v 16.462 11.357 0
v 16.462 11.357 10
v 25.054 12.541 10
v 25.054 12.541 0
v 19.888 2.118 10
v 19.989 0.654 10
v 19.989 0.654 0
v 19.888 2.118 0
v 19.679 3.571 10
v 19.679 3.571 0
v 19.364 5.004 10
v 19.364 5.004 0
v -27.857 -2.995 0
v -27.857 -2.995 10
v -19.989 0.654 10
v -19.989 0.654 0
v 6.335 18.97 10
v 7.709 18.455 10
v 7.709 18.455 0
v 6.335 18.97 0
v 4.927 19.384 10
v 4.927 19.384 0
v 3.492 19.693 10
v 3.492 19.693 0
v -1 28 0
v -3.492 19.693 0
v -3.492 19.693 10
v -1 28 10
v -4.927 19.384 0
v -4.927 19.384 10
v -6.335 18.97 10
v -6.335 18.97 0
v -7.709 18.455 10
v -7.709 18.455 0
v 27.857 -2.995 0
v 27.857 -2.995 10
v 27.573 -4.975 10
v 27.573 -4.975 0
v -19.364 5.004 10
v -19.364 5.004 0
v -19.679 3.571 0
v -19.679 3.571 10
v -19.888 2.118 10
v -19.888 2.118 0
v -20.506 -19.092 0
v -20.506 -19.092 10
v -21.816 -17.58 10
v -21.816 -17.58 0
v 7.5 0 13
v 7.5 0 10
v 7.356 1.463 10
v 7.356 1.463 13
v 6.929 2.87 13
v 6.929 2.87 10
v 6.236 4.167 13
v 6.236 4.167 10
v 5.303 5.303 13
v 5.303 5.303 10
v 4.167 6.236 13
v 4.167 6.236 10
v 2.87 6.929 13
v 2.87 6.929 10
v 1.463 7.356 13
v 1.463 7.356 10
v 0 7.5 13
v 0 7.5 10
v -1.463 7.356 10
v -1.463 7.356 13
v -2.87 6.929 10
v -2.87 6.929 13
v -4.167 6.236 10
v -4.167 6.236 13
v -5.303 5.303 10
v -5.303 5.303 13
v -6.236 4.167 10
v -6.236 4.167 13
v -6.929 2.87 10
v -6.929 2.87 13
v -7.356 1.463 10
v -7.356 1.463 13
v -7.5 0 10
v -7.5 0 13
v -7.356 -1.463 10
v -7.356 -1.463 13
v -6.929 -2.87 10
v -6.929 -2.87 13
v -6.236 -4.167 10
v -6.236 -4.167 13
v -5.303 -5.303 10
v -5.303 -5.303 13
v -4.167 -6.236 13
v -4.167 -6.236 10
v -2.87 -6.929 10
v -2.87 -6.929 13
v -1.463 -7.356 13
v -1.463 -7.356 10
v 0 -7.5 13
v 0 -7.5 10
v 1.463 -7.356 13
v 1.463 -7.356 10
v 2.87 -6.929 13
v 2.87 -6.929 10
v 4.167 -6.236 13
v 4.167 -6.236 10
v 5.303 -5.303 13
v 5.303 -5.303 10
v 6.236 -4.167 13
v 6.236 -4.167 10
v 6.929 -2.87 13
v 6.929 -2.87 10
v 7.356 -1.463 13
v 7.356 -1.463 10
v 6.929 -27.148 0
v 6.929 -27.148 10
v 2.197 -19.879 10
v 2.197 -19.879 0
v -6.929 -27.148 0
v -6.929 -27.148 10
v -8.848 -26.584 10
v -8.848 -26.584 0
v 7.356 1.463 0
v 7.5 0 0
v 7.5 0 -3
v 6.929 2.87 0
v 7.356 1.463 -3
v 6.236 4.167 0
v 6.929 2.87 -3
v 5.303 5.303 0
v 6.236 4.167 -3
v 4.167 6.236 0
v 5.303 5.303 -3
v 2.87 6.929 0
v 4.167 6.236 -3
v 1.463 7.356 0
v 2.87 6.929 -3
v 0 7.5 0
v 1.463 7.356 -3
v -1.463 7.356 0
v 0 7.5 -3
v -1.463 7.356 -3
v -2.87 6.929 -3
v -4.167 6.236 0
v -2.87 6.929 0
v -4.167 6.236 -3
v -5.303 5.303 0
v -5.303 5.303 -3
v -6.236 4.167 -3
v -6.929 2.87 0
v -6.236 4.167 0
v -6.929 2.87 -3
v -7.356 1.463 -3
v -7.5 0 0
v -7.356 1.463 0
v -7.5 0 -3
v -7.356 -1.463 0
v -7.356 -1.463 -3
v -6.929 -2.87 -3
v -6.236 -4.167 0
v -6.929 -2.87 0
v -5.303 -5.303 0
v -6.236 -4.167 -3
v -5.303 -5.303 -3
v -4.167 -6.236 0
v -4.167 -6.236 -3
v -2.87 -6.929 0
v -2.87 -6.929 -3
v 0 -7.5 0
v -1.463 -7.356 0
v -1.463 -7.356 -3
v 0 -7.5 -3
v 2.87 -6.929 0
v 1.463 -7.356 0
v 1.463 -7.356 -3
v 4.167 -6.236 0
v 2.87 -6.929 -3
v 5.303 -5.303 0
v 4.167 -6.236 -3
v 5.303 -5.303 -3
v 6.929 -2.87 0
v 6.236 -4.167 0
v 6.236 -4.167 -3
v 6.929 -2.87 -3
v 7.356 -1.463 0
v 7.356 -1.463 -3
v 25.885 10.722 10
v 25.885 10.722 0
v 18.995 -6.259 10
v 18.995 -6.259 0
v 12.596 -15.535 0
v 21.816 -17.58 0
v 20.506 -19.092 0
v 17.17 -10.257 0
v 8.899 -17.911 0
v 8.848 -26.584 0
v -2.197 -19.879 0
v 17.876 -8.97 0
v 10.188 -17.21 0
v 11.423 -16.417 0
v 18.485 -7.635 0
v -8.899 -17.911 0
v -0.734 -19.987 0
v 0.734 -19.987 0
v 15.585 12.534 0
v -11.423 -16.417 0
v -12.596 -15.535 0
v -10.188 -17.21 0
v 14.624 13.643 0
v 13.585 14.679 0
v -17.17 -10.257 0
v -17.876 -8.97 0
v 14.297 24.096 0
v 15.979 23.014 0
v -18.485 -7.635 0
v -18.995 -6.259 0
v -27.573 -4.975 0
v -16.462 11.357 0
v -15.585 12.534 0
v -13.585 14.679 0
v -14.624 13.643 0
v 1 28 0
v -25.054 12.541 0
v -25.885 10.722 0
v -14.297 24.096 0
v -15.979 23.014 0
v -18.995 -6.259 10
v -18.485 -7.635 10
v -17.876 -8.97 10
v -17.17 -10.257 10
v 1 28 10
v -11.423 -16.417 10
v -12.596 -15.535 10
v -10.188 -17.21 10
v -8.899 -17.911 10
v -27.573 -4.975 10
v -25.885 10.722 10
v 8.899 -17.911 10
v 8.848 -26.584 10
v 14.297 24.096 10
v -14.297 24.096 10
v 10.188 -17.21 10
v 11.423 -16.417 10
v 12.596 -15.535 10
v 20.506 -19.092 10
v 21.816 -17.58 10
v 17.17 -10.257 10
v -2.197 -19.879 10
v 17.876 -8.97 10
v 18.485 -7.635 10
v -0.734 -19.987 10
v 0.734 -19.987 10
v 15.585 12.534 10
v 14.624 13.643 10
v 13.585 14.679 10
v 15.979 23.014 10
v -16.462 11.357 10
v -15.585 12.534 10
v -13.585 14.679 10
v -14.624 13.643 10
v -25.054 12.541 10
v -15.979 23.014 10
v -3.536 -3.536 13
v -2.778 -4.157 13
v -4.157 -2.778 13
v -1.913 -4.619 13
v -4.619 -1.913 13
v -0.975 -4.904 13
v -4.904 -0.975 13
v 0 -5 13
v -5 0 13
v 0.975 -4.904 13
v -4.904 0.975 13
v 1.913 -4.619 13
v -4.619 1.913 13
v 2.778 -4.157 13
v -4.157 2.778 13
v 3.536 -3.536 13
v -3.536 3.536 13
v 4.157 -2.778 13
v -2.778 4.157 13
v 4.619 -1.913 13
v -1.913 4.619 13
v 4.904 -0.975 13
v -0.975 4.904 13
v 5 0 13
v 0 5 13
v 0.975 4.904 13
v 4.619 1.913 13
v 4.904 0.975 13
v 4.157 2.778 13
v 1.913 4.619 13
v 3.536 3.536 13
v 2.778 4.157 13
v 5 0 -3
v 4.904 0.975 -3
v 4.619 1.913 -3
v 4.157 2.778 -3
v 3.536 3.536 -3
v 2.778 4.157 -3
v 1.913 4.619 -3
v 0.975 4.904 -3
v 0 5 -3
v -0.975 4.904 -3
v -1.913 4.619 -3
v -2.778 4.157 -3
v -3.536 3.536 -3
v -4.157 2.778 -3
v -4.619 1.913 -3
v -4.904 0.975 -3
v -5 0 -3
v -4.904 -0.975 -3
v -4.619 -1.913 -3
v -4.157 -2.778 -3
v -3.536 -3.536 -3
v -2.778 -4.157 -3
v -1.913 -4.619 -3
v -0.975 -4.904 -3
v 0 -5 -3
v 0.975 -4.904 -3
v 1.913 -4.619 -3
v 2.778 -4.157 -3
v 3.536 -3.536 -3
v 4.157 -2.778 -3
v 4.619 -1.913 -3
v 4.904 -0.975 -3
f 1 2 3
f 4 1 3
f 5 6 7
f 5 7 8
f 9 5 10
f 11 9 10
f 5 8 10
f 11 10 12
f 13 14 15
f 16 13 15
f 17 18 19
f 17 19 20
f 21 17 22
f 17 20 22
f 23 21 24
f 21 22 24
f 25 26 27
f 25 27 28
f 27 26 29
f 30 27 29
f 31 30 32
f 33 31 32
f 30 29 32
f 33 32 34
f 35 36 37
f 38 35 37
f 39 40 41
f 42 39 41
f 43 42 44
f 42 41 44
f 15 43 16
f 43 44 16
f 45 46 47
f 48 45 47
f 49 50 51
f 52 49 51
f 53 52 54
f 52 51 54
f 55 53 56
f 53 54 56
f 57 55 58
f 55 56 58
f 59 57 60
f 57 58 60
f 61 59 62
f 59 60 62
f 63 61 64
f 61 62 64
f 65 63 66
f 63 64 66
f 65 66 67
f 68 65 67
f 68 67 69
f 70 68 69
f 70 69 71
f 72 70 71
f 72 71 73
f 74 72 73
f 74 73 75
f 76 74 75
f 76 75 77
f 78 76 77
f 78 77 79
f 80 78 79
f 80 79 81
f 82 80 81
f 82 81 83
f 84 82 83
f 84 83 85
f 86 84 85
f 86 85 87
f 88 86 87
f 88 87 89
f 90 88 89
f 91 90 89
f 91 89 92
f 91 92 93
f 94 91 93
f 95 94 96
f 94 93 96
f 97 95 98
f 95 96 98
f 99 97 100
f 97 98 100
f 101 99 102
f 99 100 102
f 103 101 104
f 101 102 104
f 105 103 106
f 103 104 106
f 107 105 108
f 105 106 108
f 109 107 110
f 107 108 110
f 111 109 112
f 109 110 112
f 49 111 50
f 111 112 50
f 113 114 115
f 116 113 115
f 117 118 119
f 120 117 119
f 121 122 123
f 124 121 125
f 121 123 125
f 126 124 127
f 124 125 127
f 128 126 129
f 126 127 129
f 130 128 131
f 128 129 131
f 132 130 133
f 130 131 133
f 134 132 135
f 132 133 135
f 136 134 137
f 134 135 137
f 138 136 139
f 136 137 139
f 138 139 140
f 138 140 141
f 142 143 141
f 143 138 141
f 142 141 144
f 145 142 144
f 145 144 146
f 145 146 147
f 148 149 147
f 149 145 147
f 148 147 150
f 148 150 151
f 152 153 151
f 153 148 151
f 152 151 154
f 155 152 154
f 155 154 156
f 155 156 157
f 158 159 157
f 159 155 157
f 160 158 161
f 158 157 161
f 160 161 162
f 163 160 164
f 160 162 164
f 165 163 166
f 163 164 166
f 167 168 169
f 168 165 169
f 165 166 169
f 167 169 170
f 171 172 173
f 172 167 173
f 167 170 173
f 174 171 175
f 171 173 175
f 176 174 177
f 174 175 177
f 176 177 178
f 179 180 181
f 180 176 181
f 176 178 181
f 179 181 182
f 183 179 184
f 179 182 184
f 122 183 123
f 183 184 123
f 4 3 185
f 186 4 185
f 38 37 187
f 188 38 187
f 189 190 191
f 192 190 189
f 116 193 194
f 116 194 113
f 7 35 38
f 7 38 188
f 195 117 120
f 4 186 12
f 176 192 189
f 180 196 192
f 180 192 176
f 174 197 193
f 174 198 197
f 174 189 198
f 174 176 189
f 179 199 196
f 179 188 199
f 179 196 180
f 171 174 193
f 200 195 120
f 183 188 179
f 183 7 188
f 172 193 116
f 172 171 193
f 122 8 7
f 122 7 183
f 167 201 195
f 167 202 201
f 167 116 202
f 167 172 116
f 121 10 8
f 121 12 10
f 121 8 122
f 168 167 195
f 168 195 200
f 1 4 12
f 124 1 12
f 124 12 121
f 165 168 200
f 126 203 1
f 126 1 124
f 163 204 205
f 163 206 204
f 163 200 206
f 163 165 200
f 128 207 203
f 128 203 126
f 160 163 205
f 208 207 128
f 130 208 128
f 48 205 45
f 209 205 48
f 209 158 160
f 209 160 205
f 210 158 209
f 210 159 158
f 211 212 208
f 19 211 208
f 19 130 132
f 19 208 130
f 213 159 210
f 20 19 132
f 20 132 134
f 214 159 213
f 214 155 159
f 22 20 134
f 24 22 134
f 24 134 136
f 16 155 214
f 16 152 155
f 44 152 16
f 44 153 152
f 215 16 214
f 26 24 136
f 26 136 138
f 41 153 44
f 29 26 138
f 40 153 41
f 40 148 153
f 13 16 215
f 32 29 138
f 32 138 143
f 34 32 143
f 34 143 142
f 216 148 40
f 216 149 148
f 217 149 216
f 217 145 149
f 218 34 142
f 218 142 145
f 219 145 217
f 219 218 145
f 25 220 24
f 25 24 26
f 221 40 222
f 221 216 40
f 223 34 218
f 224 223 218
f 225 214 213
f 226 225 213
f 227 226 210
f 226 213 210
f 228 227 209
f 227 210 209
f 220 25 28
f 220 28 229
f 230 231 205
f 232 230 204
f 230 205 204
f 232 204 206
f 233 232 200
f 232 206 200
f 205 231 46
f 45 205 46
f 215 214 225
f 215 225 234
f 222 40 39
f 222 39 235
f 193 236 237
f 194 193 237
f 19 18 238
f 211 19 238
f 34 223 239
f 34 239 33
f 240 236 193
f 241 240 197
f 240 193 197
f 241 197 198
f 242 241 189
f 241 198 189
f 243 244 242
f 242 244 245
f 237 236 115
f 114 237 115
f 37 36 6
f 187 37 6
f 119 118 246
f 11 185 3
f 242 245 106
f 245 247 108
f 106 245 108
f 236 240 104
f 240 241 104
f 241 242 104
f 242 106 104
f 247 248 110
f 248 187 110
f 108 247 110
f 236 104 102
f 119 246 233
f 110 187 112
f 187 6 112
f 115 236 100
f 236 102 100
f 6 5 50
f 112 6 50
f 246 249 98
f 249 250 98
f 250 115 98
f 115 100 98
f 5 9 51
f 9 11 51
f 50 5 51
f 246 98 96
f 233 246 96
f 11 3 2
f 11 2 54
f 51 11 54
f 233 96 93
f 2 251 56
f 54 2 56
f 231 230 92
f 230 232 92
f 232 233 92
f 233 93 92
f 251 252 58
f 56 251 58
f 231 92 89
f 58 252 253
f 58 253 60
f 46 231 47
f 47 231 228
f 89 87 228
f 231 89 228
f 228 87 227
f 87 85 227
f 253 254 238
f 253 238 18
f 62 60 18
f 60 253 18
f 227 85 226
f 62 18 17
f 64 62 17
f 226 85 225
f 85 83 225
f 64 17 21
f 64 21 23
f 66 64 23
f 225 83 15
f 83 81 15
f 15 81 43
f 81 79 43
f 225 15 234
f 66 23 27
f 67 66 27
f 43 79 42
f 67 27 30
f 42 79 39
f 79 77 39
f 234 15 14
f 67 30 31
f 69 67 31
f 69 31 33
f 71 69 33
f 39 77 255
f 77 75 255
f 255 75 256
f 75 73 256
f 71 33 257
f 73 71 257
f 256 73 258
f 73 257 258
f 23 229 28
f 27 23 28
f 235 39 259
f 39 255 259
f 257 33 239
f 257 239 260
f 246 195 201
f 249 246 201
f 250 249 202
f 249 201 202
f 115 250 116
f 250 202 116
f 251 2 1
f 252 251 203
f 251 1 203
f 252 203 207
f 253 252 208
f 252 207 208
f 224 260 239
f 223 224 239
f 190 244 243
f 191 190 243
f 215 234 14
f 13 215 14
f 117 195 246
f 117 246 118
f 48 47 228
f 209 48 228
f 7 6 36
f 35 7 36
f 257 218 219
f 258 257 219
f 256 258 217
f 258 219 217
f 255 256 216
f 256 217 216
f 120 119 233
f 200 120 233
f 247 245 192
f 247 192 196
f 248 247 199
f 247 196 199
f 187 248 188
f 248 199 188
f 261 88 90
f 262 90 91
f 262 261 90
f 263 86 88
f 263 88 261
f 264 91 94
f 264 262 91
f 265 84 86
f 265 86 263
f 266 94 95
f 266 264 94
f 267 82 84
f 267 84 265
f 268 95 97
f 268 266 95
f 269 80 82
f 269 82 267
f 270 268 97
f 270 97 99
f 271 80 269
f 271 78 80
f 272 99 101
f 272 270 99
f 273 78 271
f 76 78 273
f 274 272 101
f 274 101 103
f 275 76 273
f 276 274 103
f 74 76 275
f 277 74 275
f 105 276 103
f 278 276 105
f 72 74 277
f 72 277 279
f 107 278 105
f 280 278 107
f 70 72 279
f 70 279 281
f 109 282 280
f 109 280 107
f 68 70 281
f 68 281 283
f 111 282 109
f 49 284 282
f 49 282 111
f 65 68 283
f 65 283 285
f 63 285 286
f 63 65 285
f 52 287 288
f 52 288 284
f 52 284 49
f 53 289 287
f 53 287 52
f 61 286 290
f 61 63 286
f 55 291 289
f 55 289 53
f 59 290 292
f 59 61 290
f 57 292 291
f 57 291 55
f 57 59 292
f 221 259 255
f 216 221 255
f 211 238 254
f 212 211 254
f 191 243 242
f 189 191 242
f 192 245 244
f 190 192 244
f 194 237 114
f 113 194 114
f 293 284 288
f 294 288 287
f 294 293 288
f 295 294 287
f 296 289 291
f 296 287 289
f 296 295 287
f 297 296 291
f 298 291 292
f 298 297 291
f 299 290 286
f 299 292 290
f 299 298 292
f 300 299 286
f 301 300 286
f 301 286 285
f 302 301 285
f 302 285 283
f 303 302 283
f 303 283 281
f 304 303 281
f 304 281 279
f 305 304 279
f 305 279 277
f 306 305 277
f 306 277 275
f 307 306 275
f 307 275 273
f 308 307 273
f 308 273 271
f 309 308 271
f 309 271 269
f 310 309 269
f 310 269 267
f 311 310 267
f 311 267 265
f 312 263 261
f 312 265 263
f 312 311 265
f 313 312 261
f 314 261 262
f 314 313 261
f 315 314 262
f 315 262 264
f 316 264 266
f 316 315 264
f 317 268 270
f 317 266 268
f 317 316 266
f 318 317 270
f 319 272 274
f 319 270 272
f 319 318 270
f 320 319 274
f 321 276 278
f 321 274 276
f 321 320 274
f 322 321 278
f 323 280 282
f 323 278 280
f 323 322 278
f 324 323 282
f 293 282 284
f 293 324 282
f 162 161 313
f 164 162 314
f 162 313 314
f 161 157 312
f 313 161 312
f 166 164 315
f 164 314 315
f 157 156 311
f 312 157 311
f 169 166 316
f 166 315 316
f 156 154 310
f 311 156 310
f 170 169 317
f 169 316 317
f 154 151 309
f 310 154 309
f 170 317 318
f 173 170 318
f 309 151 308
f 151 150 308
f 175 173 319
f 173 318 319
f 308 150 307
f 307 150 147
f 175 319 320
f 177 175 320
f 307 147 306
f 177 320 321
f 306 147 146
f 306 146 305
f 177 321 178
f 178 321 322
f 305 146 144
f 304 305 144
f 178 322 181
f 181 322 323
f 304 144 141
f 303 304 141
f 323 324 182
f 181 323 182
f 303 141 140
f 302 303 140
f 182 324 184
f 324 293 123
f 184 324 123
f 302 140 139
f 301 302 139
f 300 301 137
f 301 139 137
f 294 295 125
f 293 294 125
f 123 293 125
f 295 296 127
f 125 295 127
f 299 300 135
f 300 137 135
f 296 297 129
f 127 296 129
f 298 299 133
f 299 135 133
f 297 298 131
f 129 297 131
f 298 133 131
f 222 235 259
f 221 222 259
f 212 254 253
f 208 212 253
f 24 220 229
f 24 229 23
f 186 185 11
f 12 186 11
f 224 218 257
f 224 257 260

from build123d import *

# Parameters (mm, degrees)
SKETCH1_R                = 20
BOSS_EXTRUDE1_DEPTH      = 10
BOSS_EXTRUDE2_DEPTH      = 3
BOSS_EXTRUDE2_DEPTH_BACK = 13
SKETCH2_R                = 7.5
CUT_EXTRUDE2_DEPTH       = 33.496153619
CUT_EXTRUDE2_DEPTH_BACK  = 33.496153619
SKETCH3_R                = 5
BOSS_EXTRUDE3_DEPTH      = 10


with BuildPart() as part:
    # Sketch1 → Boss-Extrude1 (new body)
    with BuildSketch(Plane.XY):
        Circle(SKETCH1_R)
    extrude(amount=BOSS_EXTRUDE1_DEPTH)

    # Sketch2 → Boss-Extrude2 (add, two sides: drawn at the far end of the back side and taken through both)
    with BuildSketch(Plane.XY.offset(10).offset(-BOSS_EXTRUDE2_DEPTH_BACK)):
        Circle(SKETCH2_R)
    extrude(amount=BOSS_EXTRUDE2_DEPTH + BOSS_EXTRUDE2_DEPTH_BACK)

    # Sketch3 → Cut-Extrude2 (cut, two sides: drawn at the far end of the back side and taken through both)
    with BuildSketch(Plane.XY.offset(13).offset(-CUT_EXTRUDE2_DEPTH_BACK)):
        Circle(SKETCH3_R)
    extrude(amount=CUT_EXTRUDE2_DEPTH + CUT_EXTRUDE2_DEPTH_BACK, mode=Mode.SUBTRACT)

    # Sketch4 → Boss-Extrude3 (add)
    with BuildSketch(Plane.XY.offset(10)):
        Polygon((-1, 28), (1, 28), (4, 18), (-4, 18), align=None)
        Polygon((6.366520583, 17.305126861), (14.296689356, 24.095739737), (15.979196422, 23.014458102), (13.096548846, 12.980000321), align=None)
        Polygon((14.711715864, 11.115998215), (25.054280857, 12.541252359), (25.885110883, 10.721988369), (18.035035968, 3.838942253), align=None)
        Polygon((18.386045307, 1.397618679), (27.857315211, -2.99499403), (27.572685534, -4.974636914), (17.247526601, -6.520952856), align=None)
        Polygon((16.222935274, -8.764494914), (21.815848816, -17.580350976), (20.506127348, -19.091850125), (10.984049403, -14.810491508), align=None)
        Polygon((8.909157918, -16.143943298), (8.848004565, -26.584070704), (6.929018618, -27.147535818), (1.233214129, -18.397803752), align=None)
        Polygon((-1.233214129, -18.397803752), (-6.929018618, -27.147535818), (-8.848004565, -26.584070704), (-8.909157918, -16.143943298), align=None)
        Polygon((-10.984049403, -14.810491508), (-20.506127348, -19.091850125), (-21.815848816, -17.580350976), (-16.222935274, -8.764494914), align=None)
        Polygon((-17.247526601, -6.520952856), (-27.572685534, -4.974636914), (-27.857315211, -2.99499403), (-18.386045307, 1.397618679), align=None)
        Polygon((-18.035035968, 3.838942253), (-25.885110883, 10.721988369), (-25.054280857, 12.541252359), (-14.711715864, 11.115998215), align=None)
        Polygon((-13.096548846, 12.980000321), (-15.979196422, 23.014458102), (-14.296689356, 24.095739737), (-6.366520583, 17.305126861), align=None)
    extrude(amount=-BOSS_EXTRUDE3_DEPTH)


solid = part.part
